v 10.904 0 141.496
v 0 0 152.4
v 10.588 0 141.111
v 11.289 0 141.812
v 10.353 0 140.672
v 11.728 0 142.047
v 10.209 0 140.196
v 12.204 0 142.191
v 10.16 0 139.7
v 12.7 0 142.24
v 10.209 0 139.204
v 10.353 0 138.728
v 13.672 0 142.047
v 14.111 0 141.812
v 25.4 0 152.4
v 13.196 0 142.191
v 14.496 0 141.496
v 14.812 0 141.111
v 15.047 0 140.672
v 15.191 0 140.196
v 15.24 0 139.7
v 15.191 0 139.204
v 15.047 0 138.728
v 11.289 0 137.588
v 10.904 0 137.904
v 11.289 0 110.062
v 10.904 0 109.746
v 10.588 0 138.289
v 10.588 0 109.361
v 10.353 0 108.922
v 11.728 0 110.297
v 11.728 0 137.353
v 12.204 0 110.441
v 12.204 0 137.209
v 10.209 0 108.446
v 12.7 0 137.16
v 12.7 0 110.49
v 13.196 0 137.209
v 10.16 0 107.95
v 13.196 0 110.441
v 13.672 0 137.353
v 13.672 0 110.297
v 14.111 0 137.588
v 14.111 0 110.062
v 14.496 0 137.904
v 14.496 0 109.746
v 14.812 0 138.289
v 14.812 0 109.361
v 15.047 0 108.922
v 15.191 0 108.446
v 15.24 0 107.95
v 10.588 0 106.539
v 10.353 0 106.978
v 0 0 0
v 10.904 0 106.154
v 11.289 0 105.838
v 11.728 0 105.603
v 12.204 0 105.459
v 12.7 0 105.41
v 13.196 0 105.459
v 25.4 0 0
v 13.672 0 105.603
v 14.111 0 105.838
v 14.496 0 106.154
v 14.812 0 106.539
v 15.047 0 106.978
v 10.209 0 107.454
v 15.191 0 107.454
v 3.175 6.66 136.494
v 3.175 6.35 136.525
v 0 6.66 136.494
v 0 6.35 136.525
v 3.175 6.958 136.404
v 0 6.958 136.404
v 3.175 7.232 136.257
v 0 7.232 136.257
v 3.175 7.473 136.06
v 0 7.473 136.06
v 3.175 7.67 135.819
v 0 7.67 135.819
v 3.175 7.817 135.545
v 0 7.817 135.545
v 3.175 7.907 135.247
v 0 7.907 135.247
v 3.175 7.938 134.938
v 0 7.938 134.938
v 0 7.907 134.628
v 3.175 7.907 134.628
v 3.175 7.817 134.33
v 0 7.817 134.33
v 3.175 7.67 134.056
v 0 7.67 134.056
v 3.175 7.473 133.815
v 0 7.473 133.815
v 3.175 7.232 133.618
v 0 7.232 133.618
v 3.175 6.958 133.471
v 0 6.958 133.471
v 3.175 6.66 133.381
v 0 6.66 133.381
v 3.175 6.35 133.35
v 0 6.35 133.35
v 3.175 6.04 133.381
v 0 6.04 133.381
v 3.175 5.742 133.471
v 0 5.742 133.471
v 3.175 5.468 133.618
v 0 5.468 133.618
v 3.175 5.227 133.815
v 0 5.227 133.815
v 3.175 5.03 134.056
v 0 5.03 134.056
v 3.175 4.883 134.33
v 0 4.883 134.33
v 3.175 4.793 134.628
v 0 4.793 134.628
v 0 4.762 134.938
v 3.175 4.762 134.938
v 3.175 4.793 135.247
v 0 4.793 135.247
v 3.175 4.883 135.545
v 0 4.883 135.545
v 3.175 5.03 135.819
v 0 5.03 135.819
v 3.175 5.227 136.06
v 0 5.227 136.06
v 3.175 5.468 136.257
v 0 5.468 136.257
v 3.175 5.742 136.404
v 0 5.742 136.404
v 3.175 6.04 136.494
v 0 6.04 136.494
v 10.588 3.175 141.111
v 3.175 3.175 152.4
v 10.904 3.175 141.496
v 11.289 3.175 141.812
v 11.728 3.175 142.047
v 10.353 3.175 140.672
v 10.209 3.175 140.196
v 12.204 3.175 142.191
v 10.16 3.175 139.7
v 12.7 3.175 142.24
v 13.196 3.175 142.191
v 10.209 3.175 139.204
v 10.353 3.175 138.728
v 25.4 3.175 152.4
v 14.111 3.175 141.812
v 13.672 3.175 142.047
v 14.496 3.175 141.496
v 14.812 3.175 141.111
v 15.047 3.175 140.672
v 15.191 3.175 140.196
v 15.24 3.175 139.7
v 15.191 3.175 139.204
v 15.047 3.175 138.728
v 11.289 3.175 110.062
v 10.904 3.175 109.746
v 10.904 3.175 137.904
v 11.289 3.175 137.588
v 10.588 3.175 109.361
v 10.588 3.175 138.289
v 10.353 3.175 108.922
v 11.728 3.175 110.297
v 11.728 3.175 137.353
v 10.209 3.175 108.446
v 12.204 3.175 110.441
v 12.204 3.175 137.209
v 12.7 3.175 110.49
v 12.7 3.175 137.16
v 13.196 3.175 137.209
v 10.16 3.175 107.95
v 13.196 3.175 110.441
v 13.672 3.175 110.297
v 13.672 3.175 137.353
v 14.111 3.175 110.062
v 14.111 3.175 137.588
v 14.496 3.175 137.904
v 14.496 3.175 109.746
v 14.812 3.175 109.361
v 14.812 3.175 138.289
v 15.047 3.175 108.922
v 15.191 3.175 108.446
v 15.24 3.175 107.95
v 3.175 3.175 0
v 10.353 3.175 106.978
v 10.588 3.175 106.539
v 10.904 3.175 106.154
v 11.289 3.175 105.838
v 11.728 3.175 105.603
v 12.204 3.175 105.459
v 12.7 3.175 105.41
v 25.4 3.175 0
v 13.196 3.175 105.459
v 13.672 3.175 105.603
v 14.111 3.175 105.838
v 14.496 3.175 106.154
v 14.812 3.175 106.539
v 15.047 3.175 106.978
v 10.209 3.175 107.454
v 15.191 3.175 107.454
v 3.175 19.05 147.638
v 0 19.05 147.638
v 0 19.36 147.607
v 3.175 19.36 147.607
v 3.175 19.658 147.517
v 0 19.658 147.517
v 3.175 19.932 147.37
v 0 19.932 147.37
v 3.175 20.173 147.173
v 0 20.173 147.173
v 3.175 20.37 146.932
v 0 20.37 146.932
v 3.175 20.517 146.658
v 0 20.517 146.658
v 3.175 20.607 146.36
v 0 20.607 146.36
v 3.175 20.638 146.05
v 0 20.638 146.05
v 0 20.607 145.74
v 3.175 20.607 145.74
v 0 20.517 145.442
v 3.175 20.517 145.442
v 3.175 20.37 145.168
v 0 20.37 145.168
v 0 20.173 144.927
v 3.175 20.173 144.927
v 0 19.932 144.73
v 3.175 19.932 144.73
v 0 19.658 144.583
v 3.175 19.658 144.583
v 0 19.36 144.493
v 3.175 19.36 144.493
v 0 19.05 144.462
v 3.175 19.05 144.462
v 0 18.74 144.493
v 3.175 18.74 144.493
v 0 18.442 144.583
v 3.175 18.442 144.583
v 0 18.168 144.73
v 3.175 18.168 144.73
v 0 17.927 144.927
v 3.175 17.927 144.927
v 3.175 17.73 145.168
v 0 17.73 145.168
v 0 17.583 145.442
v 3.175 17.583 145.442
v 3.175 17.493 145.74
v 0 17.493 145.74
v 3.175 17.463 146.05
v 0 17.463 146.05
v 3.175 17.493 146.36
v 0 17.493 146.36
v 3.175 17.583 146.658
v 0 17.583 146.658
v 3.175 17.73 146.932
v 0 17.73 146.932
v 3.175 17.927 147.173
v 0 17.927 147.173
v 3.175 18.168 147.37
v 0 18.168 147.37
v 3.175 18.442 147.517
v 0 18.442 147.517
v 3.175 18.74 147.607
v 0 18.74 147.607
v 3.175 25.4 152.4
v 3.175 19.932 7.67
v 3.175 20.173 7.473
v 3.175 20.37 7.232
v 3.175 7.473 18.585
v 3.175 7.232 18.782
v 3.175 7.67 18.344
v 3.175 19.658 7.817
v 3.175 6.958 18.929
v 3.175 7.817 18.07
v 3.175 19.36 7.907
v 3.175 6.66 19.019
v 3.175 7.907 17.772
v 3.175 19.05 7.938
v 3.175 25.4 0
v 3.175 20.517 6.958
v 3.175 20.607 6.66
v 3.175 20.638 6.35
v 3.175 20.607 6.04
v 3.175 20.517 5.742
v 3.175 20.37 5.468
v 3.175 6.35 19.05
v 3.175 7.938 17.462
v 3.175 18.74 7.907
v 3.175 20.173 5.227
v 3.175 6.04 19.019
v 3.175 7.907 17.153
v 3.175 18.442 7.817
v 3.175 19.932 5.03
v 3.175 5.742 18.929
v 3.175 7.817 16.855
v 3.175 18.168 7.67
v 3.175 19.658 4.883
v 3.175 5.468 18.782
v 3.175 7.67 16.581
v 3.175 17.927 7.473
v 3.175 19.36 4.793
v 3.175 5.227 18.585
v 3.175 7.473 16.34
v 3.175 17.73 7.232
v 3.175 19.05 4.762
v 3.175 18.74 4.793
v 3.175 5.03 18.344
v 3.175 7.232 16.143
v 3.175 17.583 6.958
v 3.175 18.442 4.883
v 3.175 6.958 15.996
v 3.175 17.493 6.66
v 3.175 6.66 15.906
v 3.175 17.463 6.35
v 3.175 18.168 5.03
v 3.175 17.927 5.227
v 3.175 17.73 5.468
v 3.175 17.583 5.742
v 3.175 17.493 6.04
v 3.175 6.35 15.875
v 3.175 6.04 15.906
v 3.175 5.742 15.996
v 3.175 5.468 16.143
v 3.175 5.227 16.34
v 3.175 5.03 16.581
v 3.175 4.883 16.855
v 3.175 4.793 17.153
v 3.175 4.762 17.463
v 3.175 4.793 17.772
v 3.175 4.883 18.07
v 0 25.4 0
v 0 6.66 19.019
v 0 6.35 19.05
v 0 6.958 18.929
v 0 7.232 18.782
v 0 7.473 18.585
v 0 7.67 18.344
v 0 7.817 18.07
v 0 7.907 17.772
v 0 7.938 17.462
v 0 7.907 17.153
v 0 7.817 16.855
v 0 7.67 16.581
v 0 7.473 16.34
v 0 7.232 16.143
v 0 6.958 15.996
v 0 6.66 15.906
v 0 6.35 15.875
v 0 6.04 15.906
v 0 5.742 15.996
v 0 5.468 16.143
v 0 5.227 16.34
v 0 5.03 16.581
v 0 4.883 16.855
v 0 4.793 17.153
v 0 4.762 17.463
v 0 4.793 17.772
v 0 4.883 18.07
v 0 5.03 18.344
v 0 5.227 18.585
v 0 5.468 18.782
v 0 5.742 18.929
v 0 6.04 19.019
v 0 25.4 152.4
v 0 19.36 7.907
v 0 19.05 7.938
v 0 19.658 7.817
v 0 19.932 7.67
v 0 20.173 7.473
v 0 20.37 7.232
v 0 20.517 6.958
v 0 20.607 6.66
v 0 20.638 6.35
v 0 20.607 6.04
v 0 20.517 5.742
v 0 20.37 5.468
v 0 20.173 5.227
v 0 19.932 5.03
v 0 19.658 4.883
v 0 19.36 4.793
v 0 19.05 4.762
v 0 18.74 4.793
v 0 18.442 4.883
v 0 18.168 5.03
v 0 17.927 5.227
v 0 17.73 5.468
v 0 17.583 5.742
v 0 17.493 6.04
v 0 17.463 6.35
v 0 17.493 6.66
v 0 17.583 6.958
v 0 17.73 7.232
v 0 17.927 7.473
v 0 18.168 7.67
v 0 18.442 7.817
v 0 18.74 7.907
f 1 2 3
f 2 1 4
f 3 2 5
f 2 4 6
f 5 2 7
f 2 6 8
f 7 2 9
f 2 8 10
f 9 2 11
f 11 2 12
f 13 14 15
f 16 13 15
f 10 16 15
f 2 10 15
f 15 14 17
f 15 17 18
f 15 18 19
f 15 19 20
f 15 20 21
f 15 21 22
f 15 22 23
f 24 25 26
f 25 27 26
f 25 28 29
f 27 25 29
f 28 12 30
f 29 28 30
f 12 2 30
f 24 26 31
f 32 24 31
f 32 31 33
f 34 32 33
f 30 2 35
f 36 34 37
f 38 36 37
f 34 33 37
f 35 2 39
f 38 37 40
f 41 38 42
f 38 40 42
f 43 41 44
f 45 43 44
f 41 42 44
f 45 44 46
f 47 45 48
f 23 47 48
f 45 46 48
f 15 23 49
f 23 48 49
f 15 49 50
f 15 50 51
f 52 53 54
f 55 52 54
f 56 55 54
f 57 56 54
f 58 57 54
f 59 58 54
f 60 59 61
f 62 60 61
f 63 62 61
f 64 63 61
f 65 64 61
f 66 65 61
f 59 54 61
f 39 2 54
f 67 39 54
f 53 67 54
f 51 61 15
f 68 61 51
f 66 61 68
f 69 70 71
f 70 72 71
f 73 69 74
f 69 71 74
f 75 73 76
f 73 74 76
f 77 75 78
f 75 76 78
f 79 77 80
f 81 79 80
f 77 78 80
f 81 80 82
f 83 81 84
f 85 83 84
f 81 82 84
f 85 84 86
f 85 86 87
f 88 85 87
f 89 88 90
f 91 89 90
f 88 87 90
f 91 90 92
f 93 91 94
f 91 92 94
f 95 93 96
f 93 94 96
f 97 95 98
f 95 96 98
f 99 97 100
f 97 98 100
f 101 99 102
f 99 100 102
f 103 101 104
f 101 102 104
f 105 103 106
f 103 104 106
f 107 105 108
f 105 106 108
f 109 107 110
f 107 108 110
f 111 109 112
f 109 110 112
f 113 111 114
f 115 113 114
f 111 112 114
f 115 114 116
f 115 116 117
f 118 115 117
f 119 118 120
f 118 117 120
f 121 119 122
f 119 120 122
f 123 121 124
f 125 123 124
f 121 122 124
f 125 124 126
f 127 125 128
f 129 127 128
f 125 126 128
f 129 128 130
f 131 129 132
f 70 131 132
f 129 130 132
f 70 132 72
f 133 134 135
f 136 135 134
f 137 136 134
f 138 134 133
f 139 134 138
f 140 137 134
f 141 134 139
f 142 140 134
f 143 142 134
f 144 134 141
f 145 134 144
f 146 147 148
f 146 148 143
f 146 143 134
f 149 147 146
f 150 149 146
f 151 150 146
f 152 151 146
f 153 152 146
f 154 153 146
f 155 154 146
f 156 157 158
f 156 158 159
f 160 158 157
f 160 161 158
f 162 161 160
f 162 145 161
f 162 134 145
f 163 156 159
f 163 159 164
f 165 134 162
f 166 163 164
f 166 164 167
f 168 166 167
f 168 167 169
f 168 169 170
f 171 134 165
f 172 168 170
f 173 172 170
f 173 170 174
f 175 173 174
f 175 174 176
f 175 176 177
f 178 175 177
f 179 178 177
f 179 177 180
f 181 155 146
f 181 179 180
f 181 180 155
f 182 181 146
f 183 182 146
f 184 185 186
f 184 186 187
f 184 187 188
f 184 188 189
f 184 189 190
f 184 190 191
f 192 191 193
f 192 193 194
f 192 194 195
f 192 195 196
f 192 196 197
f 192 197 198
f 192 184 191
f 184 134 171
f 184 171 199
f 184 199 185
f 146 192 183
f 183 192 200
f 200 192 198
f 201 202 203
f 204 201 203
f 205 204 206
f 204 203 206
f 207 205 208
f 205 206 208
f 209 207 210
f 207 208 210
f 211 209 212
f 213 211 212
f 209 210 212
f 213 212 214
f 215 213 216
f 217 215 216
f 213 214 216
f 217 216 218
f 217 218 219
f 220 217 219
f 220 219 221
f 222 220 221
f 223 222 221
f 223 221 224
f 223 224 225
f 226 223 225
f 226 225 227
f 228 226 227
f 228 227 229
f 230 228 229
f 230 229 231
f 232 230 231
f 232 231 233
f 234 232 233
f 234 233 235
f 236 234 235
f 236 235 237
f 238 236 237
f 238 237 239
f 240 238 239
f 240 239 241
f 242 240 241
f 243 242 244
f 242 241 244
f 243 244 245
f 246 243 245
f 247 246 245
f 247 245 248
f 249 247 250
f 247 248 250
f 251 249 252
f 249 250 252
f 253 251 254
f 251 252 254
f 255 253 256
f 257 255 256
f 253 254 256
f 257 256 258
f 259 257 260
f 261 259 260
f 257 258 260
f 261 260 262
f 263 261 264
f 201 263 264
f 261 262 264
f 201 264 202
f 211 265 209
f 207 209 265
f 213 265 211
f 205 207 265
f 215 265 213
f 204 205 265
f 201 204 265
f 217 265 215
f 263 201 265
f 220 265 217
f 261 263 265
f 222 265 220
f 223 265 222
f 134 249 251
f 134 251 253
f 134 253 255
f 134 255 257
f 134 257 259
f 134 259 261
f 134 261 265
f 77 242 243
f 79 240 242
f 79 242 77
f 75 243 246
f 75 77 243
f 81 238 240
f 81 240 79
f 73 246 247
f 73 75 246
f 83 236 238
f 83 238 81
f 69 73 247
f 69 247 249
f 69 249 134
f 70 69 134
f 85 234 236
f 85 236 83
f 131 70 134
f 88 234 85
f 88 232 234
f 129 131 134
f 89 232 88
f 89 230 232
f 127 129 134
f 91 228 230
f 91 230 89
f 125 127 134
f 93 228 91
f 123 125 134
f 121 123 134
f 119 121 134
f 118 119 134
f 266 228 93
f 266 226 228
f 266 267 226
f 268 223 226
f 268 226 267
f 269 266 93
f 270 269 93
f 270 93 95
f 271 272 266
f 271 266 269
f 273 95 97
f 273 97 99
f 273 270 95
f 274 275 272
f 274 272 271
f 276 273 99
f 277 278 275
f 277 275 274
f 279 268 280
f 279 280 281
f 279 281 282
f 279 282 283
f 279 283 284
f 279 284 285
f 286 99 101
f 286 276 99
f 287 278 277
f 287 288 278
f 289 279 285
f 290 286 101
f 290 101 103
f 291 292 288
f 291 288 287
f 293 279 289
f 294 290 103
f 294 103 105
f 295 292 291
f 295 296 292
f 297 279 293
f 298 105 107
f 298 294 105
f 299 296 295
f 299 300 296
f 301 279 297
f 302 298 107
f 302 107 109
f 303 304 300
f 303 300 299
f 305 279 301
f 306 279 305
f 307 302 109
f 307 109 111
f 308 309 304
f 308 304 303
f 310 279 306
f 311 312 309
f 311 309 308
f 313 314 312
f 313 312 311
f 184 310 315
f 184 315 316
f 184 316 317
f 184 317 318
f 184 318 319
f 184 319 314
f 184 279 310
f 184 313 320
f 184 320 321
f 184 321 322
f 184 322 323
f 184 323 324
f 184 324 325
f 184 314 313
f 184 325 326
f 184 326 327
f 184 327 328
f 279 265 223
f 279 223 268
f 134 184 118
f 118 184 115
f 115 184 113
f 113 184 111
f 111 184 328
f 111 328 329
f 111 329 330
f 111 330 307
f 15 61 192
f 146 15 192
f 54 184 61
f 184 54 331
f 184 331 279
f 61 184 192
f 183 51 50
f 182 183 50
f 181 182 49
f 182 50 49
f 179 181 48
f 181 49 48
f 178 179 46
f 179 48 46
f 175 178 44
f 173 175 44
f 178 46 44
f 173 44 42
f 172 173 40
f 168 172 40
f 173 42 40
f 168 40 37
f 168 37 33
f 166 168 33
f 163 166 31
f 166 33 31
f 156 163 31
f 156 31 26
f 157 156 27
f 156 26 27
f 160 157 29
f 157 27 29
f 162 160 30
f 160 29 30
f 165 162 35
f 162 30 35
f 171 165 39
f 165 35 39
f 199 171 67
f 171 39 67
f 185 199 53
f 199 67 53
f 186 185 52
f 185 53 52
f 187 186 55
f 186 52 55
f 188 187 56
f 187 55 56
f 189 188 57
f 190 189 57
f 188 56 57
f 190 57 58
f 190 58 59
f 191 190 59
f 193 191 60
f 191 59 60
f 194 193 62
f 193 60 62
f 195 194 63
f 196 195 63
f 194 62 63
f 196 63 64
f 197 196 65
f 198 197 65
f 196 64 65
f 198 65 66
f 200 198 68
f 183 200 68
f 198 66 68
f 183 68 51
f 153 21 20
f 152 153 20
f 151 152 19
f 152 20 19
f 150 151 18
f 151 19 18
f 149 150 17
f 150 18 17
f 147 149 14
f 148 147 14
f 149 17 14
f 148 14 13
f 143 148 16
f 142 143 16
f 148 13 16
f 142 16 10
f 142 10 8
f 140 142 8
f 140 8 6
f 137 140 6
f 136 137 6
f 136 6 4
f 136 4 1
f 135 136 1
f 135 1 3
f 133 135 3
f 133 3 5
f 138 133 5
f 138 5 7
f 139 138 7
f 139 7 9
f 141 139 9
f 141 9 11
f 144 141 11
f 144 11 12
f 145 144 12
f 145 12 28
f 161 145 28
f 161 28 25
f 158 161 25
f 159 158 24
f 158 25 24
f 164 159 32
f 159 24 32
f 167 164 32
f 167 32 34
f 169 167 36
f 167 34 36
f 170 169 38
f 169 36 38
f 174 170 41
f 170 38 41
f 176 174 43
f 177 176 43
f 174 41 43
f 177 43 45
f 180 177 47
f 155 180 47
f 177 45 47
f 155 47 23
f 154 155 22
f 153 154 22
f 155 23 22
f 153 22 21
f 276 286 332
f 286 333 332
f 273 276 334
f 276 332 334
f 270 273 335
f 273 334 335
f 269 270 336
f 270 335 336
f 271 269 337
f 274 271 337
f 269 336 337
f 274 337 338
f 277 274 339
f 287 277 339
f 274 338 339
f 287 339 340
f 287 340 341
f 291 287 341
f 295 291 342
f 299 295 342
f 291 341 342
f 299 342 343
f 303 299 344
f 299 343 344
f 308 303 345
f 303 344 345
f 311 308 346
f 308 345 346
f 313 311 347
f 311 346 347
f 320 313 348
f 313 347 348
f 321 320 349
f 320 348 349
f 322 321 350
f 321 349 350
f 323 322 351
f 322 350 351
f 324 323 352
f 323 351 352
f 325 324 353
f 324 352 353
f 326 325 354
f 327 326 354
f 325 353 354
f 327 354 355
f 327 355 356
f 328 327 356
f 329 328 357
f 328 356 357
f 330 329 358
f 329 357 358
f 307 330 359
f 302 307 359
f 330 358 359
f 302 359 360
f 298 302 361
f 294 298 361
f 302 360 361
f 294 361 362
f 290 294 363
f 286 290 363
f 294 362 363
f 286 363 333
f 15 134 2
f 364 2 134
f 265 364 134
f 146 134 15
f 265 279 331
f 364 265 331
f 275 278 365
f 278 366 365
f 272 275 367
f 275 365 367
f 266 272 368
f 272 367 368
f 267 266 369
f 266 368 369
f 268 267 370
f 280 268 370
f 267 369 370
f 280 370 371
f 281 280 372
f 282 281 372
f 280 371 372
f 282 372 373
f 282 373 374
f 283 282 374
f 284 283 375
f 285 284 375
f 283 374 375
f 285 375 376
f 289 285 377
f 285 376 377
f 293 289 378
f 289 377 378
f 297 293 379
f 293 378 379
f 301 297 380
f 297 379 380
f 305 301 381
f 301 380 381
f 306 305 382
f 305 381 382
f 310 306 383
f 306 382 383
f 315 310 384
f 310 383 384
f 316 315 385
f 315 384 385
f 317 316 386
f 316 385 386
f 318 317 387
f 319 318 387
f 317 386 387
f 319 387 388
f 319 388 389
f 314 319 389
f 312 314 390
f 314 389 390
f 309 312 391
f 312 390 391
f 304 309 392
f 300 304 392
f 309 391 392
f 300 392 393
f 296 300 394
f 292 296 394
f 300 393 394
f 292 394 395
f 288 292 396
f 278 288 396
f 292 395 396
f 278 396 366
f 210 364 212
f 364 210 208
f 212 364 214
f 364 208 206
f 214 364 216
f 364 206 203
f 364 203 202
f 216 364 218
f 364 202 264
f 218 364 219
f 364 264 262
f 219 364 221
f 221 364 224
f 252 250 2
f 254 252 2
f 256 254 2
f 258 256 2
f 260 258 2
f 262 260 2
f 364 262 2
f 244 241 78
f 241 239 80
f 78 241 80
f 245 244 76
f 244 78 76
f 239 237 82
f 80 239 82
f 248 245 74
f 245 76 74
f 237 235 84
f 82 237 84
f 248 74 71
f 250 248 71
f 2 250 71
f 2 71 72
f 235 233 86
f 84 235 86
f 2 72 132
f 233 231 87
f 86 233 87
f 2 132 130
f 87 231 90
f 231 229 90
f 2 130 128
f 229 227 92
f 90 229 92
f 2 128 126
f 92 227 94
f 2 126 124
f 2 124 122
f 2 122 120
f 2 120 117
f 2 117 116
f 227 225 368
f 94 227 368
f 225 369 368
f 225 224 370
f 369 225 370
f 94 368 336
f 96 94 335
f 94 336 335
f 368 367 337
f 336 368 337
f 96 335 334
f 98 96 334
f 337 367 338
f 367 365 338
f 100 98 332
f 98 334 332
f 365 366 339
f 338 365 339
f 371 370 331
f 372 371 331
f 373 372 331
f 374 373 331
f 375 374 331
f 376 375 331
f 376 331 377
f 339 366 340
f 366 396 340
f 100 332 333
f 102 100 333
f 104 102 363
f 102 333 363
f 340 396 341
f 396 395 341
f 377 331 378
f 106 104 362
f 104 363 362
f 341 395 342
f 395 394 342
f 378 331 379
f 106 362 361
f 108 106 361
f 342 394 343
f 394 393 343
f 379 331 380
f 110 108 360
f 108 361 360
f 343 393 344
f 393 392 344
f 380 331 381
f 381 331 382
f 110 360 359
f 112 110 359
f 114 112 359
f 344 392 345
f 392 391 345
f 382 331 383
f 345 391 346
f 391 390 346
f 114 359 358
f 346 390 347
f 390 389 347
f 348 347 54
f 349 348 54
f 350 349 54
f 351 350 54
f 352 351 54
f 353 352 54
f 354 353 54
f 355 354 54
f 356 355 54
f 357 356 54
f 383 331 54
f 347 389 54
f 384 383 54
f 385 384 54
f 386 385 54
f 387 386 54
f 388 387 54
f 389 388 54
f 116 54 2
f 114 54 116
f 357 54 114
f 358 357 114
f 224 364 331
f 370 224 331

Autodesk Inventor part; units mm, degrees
ref_plane "YZ Plane" through (0, 0, 0) normal (1, 0, 0) x (0, 1, 0)
ref_plane "XZ Plane" through (0, 0, 0) normal (0, 1, 0) x (-1, 0, 0)
ref_plane "XY Plane" through (0, 0, 0) normal (0, 0, 1) x (1, 0, 0)
sketch "Sketch1" plane through (0, 0, 0) normal (0, 0, 1) x (1, 0, 0)
  line L0 (0, 0) -> (25.4, 0)
  line L1 (25.4, 0) -> (25.4, 3.175)
  line L2 (3.175, 25.4) -> (0, 25.4)
  line L3 (0, 25.4) -> (0, 0)
  line L4 (3.175, 25.4) -> (3.175, 3.175)
  line L5 (3.175, 3.175) -> (25.4, 3.175)
  dimension "d0" = 25.4
  dimension "d1" = 25.4
  dimension "d2" = 3.175
  dimension "d3" = 3.175
extrude "Extrusion1" add sketch "Sketch1" along normal blind 152.4
sketch "Sketch3" plane through (0, 0, 0) normal (0, -1, 0) x (1, 0, 0)
  line L0 (25.4, 152.4) -> (0, 152.4) projected
  line L1 (0, 0) -> (0, 152.4) projected
  circle A0 centre (12.7, 107.95) radius 2.54
  circle A1 centre (12.7, 139.7) radius 2.54
  dimension "d20" = 12.7
  dimension "d21" = 31.75
  dimension "d22" = 5.08
  dimension "d23" = 12.7
extrude "Extrusion4" cut sketch "Sketch3" against normal blind 25.4
sketch "Sketch4" plane through (0, 0, 0) normal (-1, 0, 0) x (0, 0, 1)
  line L0 (0, 25.4) -> (0, 0) projected
  line L1 (0, 0) -> (152.4, 0) projected
  circle A0 centre (6.35, 19.05) radius 1.5875
  circle A1 centre (17.4625, 6.35) radius 1.5875
  line L2 (0, 25.4) -> (152.4, 25.4) projected
  line L3 (76.2, 25.4) -> (76.2, 0)
  circle A2 centre (146.05, 19.05) radius 1.5875
  circle A3 centre (134.9375, 6.35) radius 1.5875
  dimension "d26" = 6.35
  dimension "d27" = 19.05
  dimension "d28" = 3.175
  dimension "d29" = 6.35
  dimension "d30" = 17.4625
extrude "Extrusion5" cut sketch "Sketch4" against normal blind 25.4 contours A0 | A1 | A2 | A3
equation "\"d2\" = d3"
properties part number "8 ball corner L"
